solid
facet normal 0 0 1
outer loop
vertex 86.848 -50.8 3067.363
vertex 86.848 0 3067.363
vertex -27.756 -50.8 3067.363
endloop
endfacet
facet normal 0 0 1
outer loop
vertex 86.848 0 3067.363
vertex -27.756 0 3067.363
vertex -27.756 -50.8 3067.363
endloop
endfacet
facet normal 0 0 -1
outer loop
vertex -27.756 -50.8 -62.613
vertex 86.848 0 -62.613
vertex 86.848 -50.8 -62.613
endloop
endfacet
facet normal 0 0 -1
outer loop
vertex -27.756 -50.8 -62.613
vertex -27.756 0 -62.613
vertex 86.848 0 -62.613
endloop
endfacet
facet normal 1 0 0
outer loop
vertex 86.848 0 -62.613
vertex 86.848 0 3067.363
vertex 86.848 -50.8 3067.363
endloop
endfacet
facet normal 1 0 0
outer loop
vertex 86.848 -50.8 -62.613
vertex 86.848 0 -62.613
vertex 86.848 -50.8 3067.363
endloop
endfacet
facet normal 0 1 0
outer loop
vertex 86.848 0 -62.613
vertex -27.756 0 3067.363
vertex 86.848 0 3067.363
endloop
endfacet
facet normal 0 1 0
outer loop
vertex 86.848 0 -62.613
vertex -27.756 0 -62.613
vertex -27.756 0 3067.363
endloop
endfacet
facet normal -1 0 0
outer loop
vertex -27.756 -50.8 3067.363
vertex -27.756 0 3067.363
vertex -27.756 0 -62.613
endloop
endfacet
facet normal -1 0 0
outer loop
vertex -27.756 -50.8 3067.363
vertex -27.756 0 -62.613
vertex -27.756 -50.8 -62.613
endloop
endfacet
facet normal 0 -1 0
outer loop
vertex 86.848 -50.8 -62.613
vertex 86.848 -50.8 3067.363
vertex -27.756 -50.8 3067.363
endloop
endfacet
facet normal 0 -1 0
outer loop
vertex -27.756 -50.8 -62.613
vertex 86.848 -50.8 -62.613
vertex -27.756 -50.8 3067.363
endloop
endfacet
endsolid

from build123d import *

# Parameters (mm, degrees)
F0_W     = 13.0043746904
F0_H     = 81.9757804275
F1_DEPTH = 50.8
F2_DEPTH = 101.6
F3_DEPTH = 3048


with BuildPart() as f1:
    # F0 (on Front) → F1 (new body)
    with BuildSketch(Plane.XZ):
        with Locations((-21.2537511252, -21.6252319515)):
            Rectangle(F0_W, F0_H)
    extrude(amount=F1_DEPTH)

    # F2 (add): a face of the model
    f2_faces = [f1.faces().sort_by_distance(p)[0] for p in [
        (-14.75156378, -25.4, -21.6252319515),
    ]]
    extrude(f2_faces, amount=F2_DEPTH)

    # F3 (add): a face of the model
    f3_faces = [f1.faces().sort_by_distance(p)[0] for p in [
        (29.5462488748, -25.4, 19.3626582623),
    ]]
    extrude(f3_faces, amount=F3_DEPTH)


solid = f1.part
